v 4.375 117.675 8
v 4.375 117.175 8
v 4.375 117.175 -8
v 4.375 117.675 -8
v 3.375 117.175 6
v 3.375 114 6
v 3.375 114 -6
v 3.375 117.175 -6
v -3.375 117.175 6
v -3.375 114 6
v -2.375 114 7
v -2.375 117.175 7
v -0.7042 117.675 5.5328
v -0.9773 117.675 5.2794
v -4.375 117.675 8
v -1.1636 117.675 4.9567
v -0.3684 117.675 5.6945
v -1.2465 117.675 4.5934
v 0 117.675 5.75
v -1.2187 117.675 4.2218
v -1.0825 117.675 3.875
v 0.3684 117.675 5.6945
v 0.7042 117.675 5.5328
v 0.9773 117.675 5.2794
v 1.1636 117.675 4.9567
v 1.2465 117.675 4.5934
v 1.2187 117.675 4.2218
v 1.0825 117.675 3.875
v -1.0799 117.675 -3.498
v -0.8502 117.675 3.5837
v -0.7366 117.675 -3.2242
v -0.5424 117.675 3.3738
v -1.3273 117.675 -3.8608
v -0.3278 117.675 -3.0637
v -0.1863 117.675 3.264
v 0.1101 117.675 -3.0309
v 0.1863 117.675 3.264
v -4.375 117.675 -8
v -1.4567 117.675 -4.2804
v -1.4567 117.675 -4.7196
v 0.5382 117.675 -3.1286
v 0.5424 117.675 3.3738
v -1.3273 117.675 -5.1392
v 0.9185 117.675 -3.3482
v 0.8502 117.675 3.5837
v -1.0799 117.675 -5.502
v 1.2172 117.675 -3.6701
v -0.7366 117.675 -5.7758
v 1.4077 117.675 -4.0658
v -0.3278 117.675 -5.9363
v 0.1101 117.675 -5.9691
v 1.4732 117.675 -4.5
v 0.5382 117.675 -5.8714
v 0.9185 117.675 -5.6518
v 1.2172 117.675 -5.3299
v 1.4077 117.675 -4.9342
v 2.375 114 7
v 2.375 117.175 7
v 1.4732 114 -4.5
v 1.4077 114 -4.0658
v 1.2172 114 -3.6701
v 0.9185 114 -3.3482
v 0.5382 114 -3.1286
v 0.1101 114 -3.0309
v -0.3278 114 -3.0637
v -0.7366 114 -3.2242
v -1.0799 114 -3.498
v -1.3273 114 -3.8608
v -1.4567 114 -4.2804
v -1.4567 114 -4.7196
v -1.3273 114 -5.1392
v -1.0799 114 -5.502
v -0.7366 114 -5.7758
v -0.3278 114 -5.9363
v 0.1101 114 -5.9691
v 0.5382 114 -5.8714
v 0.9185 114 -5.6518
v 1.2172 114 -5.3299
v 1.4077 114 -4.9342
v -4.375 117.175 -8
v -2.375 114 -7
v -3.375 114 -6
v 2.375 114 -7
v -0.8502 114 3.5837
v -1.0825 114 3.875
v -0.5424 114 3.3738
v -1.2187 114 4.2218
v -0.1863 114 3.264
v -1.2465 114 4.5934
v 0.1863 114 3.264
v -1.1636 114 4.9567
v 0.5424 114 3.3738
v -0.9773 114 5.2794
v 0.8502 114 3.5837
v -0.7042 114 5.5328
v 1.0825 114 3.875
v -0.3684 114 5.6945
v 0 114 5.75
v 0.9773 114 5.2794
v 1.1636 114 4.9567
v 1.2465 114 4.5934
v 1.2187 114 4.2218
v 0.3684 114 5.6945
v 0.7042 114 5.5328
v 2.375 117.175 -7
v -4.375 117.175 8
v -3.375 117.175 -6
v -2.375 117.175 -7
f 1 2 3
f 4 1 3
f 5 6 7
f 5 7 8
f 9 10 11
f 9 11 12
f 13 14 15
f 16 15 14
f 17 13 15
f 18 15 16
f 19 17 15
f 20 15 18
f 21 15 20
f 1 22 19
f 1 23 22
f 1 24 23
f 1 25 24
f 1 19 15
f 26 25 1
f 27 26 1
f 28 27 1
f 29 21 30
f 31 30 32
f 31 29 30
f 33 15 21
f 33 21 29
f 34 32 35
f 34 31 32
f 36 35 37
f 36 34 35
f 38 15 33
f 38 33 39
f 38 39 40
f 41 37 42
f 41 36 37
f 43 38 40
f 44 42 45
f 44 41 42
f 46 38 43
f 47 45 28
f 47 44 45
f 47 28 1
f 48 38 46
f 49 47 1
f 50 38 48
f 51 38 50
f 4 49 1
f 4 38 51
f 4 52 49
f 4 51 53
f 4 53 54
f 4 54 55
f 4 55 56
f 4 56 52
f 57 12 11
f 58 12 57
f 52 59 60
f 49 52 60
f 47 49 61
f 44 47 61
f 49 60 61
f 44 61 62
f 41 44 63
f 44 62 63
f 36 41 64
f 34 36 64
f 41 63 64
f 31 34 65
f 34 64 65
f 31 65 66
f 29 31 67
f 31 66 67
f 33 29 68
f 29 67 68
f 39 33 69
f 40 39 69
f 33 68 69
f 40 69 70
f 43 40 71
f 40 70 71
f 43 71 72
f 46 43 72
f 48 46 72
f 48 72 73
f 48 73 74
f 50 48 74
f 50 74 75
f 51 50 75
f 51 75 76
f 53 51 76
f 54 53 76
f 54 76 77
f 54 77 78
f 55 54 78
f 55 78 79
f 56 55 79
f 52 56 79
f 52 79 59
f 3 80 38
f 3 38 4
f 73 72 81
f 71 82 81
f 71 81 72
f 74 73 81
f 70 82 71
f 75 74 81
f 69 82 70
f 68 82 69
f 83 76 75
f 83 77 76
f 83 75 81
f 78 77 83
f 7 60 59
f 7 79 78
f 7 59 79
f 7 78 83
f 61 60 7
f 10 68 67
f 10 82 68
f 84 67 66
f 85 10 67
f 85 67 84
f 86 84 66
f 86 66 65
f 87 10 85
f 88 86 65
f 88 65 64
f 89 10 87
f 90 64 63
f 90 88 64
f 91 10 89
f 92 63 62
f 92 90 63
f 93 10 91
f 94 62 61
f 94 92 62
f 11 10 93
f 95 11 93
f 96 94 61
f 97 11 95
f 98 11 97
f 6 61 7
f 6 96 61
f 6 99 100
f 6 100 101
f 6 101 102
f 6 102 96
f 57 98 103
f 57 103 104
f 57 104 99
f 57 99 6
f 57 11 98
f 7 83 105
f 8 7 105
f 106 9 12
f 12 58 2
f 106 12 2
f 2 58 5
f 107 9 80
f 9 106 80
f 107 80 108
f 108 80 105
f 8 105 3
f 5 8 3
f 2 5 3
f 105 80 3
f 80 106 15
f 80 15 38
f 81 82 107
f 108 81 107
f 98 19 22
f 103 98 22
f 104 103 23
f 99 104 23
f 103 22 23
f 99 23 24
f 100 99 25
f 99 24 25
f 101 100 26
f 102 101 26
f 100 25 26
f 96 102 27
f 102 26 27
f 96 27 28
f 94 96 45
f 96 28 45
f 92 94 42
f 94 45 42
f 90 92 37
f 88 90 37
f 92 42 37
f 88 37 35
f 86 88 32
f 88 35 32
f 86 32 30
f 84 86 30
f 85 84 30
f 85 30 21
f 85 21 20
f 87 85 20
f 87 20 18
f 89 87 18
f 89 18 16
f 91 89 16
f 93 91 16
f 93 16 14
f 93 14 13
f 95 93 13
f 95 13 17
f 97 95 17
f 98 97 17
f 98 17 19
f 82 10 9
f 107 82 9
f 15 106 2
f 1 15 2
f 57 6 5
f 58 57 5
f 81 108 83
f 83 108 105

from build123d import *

# Parameters (mm, degrees)
SKETCH1_W             = 6.75
SKETCH1_H             = 3.175
EXTRUDE1_DEPTH        = 7
SKETCH6_W             = 8.75
SKETCH6_H             = 16
EXTRUDE2_DEPTH        = 0.5
F_4_CLEARANCE_HOLE1_D = 2.9464
SKETCH3_R             = 1.25
CUT_EXTRUDE1_DEPTH    = 4.675
CHAMFER1_SIZE         = 1


with BuildPart() as part:
    # Sketch1 → Extrude1 (new body, symmetric)
    with BuildSketch(Plane.XY):
        with Locations((0, 115.5875)):
            Rectangle(SKETCH1_W, SKETCH1_H)
    extrude(amount=EXTRUDE1_DEPTH, both=True)

    # Sketch6 → Extrude2 (add)
    with BuildSketch(Plane(origin=(0, 117.175, 0), x_dir=(1, 0, 0), z_dir=(0, 1, 0))):
        Rectangle(SKETCH6_W, SKETCH6_H)
    extrude(amount=EXTRUDE2_DEPTH)

    # 4 Clearance Hole1 (through all)
    with Locations(Plane(origin=(-0.355703292, 117.675, 3.885176073), x_dir=(-1, 0, 0), z_dir=(0, 1, 0))):
        with Locations((-0.355703292, -8.385176073)):
            Hole(F_4_CLEARANCE_HOLE1_D / 2)

    # Sketch3 → Cut-Extrude1 (cut, through all)
    with BuildSketch(Plane(origin=(0, 117.675, 0), x_dir=(1, 0, 0), z_dir=(0, 1, 0))):
        with Locations(Location((0, -4.5, 0), (0, 0, 270))):  # turned: the seam where the file's is
            Circle(SKETCH3_R)
    extrude(amount=-CUT_EXTRUDE1_DEPTH, mode=Mode.SUBTRACT)

    # Chamfer1
    chamfer1_edges = [part.edges().sort_by_distance(p)[0] for p in [
        (-3.375, 115.5875, 7),
        (-3.375, 115.5875, -7),
        (3.375, 115.5875, -7),
        (3.375, 115.5875, 7),
    ]]
    chamfer(chamfer1_edges, length=CHAMFER1_SIZE)


solid = part.part
